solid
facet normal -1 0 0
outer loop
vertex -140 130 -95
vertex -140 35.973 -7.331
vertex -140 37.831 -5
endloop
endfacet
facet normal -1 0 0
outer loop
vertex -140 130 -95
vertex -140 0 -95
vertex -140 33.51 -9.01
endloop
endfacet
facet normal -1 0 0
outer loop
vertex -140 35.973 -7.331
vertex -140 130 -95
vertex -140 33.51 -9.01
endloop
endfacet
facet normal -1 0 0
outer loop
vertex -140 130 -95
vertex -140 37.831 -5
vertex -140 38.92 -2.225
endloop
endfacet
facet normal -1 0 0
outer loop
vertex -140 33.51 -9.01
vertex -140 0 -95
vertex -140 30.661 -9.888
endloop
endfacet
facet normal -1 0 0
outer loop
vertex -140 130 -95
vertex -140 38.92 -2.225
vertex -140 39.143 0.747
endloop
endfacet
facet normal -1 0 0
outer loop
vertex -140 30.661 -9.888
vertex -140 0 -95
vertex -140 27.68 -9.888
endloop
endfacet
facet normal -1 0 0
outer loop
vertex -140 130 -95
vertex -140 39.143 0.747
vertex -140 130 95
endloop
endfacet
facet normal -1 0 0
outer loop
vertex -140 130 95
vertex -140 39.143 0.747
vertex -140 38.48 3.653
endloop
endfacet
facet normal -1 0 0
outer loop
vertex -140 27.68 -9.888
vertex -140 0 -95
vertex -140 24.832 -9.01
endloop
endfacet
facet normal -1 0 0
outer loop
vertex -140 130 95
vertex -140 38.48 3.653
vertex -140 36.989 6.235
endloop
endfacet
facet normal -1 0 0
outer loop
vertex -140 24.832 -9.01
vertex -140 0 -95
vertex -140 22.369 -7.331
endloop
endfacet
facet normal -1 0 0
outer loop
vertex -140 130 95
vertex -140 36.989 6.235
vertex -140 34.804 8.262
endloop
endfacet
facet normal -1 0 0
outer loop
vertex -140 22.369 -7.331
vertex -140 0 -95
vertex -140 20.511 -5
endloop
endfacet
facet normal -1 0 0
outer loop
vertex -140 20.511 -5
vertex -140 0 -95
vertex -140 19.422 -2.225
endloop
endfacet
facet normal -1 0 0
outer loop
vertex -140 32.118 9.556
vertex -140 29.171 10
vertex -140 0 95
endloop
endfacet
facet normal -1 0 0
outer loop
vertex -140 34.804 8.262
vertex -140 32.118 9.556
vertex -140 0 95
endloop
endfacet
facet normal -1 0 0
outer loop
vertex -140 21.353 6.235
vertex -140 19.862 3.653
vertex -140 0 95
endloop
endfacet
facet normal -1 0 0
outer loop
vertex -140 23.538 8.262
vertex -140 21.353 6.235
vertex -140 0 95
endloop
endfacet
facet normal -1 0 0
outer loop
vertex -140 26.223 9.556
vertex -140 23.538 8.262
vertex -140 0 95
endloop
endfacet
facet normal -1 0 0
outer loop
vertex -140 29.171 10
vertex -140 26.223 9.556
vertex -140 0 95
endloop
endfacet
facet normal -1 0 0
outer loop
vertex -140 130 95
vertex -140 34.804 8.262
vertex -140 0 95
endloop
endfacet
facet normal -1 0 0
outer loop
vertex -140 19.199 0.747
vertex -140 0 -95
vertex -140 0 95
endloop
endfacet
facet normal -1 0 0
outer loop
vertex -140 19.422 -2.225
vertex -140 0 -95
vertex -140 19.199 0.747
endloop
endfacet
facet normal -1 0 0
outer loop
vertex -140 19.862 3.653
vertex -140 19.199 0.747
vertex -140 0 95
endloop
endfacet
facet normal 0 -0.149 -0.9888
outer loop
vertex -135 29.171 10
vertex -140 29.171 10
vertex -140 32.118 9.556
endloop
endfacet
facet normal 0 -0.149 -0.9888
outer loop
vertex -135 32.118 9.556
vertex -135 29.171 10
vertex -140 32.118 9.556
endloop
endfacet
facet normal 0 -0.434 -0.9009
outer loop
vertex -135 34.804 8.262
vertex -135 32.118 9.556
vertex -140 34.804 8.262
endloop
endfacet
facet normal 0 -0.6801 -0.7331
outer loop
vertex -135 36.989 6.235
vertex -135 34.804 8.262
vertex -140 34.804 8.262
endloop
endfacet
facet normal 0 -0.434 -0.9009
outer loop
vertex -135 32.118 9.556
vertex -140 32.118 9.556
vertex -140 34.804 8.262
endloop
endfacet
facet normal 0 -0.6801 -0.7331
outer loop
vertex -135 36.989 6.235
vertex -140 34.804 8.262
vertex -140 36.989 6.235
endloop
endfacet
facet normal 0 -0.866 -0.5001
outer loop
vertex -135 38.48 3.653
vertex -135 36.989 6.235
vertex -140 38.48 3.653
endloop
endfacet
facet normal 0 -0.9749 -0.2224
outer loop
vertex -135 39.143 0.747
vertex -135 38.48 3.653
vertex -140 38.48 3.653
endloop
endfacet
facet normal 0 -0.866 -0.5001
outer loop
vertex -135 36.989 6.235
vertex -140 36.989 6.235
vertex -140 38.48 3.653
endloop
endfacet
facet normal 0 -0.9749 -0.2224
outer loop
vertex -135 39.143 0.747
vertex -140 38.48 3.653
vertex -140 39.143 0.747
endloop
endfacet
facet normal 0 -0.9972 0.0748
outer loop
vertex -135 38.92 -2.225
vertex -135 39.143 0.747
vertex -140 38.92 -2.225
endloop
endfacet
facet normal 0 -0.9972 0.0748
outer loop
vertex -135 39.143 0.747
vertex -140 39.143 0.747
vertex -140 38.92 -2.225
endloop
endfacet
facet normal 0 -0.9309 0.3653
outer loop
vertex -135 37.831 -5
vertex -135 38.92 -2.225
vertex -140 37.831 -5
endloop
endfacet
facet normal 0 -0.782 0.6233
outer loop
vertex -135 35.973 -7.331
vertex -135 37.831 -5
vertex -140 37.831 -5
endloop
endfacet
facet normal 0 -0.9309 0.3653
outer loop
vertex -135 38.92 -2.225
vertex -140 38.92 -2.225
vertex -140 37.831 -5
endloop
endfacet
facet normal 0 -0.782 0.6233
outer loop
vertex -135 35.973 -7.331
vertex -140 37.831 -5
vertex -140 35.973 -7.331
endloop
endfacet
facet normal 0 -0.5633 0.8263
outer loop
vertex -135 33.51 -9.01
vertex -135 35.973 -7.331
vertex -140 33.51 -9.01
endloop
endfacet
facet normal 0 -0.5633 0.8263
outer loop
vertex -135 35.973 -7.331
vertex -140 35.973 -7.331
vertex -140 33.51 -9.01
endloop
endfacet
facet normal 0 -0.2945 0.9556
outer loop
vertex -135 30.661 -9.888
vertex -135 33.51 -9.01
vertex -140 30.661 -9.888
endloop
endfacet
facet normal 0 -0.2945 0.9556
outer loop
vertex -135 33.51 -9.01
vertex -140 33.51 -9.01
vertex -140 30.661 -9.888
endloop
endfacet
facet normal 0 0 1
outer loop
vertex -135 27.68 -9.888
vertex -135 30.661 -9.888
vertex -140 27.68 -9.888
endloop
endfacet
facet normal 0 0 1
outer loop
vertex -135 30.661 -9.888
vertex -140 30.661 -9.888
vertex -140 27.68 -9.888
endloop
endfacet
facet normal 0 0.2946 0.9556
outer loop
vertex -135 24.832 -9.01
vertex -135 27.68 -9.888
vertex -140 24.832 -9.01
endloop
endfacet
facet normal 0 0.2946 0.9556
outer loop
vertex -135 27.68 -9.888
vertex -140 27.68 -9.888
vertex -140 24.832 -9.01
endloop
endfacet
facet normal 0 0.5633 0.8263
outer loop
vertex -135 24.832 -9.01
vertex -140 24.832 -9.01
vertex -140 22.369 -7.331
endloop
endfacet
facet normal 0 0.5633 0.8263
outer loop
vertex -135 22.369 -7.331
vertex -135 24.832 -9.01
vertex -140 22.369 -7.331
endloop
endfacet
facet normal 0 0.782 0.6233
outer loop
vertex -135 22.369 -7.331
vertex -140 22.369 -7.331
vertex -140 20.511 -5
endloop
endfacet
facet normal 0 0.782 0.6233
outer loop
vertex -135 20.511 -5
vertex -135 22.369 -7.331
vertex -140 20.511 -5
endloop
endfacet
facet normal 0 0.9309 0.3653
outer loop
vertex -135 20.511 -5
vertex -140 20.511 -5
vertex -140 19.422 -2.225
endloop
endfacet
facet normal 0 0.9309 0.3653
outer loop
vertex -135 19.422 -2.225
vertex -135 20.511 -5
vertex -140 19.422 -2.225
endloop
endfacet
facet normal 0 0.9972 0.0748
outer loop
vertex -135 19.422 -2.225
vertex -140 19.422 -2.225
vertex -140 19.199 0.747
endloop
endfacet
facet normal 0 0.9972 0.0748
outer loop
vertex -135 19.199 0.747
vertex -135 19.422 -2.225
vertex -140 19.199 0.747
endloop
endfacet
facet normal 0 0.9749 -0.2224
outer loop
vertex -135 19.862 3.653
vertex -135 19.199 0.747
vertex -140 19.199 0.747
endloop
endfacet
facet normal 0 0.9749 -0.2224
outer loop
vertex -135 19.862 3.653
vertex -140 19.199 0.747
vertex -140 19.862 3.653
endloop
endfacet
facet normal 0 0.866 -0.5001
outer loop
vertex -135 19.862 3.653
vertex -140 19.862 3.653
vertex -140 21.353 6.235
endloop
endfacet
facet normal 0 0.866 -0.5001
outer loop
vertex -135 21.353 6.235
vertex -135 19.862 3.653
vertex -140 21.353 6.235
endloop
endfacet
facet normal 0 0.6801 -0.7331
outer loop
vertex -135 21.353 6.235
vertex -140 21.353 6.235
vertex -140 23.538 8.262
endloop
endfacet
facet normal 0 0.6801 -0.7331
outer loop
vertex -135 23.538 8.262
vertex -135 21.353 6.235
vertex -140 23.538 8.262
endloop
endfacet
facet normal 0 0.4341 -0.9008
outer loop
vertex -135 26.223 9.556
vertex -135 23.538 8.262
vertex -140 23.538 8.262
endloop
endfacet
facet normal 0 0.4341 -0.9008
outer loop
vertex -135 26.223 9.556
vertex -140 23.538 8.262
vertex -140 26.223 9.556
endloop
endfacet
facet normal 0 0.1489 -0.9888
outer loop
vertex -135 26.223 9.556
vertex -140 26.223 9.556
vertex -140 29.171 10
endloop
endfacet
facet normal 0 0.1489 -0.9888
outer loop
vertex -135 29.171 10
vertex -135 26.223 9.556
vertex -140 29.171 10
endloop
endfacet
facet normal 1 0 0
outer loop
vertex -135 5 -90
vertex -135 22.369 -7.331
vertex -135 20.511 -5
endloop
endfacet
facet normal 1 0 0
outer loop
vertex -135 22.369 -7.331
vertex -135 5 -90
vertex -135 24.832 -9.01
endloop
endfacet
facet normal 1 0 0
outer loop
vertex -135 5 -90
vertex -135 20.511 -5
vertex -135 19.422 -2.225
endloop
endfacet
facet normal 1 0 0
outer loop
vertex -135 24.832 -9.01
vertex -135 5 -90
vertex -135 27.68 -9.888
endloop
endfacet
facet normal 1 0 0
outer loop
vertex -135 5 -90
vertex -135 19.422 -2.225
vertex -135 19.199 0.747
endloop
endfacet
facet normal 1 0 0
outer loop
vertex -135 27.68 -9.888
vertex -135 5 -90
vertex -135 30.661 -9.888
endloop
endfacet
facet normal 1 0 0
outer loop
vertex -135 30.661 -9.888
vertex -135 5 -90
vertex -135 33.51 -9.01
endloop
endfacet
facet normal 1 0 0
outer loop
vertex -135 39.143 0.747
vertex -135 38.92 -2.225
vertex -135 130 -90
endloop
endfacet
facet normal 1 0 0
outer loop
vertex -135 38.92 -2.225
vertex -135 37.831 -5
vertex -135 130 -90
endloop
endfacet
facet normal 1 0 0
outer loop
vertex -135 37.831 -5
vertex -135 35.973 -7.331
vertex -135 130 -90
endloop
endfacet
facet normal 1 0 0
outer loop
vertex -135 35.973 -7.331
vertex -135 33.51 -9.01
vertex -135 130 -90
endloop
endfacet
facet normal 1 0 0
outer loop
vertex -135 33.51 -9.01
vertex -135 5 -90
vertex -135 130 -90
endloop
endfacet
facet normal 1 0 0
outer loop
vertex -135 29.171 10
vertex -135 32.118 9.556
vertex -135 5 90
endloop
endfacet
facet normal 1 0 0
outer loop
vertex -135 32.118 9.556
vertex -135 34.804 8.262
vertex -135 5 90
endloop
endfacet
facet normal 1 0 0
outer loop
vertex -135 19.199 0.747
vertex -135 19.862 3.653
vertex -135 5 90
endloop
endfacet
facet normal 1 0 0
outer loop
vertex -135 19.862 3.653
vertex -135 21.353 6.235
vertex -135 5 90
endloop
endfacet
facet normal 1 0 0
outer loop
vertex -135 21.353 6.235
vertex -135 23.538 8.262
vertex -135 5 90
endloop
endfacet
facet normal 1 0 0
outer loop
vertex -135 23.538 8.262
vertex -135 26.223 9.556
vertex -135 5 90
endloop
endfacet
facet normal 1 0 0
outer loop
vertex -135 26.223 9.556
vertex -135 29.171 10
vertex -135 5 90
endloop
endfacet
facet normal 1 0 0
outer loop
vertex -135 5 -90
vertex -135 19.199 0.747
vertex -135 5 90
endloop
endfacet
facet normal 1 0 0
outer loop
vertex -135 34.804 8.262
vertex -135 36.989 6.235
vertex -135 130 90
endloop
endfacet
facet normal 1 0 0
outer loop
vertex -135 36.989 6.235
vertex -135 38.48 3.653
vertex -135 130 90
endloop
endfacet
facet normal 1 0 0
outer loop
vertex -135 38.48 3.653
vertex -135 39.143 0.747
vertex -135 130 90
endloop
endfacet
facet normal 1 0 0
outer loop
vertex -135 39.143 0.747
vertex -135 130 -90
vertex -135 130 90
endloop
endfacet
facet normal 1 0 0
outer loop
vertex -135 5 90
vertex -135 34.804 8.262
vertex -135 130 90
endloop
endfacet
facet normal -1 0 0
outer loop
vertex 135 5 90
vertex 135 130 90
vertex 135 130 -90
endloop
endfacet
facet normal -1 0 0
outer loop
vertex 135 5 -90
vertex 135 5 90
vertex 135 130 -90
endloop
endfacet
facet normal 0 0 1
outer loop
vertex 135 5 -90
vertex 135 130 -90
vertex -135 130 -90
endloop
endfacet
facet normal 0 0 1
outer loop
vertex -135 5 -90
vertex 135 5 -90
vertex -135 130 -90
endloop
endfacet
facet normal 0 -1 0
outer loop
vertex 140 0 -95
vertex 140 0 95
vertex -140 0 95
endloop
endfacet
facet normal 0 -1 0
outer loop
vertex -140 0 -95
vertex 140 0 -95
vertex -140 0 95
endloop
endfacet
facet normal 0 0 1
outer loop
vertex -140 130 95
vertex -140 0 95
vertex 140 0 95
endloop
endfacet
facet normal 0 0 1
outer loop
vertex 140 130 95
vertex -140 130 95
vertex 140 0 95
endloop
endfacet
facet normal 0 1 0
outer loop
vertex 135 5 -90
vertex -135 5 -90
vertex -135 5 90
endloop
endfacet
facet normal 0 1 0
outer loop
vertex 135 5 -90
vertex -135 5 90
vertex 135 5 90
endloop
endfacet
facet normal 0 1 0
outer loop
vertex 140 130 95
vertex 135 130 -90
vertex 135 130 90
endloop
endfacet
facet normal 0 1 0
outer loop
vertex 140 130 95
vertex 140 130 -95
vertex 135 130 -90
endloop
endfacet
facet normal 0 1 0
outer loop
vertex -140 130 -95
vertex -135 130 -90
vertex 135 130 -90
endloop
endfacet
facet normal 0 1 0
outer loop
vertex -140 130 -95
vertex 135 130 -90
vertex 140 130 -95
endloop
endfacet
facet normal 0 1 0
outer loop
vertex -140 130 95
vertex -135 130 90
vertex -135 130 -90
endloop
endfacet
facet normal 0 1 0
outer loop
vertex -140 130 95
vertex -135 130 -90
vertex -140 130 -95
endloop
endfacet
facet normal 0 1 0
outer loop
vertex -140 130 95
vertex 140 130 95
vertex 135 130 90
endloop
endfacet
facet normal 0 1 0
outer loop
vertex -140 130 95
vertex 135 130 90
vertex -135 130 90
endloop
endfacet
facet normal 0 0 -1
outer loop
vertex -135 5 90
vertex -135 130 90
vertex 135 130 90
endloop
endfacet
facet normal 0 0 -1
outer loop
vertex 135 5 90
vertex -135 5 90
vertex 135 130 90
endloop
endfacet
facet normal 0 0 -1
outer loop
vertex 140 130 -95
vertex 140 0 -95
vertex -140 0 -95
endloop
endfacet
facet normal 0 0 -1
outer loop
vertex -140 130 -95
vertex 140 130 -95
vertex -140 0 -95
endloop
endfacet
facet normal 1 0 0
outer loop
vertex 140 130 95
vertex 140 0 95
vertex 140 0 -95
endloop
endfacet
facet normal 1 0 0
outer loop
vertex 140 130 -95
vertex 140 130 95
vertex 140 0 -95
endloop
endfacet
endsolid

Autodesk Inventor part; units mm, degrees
ref_plane "YZ Plane" through (0, 0, 0) normal (1, 0, 0) x (0, 1, 0)
ref_plane "XZ Plane" through (0, 0, 0) normal (0, 1, 0) x (-1, 0, 0)
ref_plane "XY Plane" through (0, 0, 0) normal (0, 0, 1) x (1, 0, 0)
sketch "Boceto1" plane through (0, 0, 0) normal (0, 1, 0) x (-1, 0, 0)
  line L0 (140, 95) -> (-140, 95)
  line L1 (-140, 95) -> (-140, -95)
  line L2 (-140, -95) -> (140, -95)
  line L3 (140, -95) -> (140, 95)
  point P0 (0, 0)
  dimension "d0" = 280
  dimension "d1" = 190
  dimension "d2" = 95
  dimension "d3" = 140
extrude "Extrusión1" add sketch "Boceto1" along normal blind 130
ref_plane "Plano de trabajo1" through (0, 0, 95) normal (1, 0, 0) x (0, 0, -1)
ref_plane "Plano de trabajo2" through (140, 0, 0) normal (0, 0, -1) x (-1, 0, 0)
sketch "Boceto3" plane through (0, 130, 0) normal (0, 1, 0) x (1, 0, 0)
  line L0 (140, 95) -> (-140, 95) projected
  line L1 (-140, 95) -> (-140, -95) projected
  line L2 (-140, -95) -> (140, -95) projected
  line L3 (140, -95) -> (140, 95) projected
  line L4 (-135, -90) -> (135, -90)
  line L5 (135, -90) -> (135, 90)
  line L6 (135, 90) -> (-135, 90)
  line L7 (-135, 90) -> (-135, -90)
  point P0 (0, 0)
  dimension "d7" = 270
  dimension "d8" = 135
  dimension "d9" = 180
  dimension "d10" = 90
extrude "Extrusión2" cut sketch "Boceto3" against normal blind 125 contours L7 L6 L5 L4
sketch "Boceto4" plane through (-140, 0, -95) normal (-1, 0, 0) x (0, 0, 1)
  circle A0 centre (95, 29.1709) radius 10
  point P0 (95, 0)
  dimension "d13" = 20
extrude "Extrusión3" cut sketch "Boceto4" against normal blind 5
sketch "Boceto6" plane through (0, 130, 0) normal (0, 1, 0) x (1, 0, 0)
  line L0 (-140, -95) -> (140, -95) projected
  line L1 (-140, 95) -> (-140, -95) projected
  line L2 (140, 95) -> (-140, 95) projected
  line L3 (140, -95) -> (140, 95) projected
  line L4 (-140, -95) -> (140, -95)
  line L5 (140, -95) -> (140, 95)
  line L6 (140, 95) -> (-140, 95)
  line L7 (-140, 95) -> (-140, -95)
  point P0 (0, 0)
extrude "Extrusión4" [suppressed]
properties part number "cajaEléctrica"
